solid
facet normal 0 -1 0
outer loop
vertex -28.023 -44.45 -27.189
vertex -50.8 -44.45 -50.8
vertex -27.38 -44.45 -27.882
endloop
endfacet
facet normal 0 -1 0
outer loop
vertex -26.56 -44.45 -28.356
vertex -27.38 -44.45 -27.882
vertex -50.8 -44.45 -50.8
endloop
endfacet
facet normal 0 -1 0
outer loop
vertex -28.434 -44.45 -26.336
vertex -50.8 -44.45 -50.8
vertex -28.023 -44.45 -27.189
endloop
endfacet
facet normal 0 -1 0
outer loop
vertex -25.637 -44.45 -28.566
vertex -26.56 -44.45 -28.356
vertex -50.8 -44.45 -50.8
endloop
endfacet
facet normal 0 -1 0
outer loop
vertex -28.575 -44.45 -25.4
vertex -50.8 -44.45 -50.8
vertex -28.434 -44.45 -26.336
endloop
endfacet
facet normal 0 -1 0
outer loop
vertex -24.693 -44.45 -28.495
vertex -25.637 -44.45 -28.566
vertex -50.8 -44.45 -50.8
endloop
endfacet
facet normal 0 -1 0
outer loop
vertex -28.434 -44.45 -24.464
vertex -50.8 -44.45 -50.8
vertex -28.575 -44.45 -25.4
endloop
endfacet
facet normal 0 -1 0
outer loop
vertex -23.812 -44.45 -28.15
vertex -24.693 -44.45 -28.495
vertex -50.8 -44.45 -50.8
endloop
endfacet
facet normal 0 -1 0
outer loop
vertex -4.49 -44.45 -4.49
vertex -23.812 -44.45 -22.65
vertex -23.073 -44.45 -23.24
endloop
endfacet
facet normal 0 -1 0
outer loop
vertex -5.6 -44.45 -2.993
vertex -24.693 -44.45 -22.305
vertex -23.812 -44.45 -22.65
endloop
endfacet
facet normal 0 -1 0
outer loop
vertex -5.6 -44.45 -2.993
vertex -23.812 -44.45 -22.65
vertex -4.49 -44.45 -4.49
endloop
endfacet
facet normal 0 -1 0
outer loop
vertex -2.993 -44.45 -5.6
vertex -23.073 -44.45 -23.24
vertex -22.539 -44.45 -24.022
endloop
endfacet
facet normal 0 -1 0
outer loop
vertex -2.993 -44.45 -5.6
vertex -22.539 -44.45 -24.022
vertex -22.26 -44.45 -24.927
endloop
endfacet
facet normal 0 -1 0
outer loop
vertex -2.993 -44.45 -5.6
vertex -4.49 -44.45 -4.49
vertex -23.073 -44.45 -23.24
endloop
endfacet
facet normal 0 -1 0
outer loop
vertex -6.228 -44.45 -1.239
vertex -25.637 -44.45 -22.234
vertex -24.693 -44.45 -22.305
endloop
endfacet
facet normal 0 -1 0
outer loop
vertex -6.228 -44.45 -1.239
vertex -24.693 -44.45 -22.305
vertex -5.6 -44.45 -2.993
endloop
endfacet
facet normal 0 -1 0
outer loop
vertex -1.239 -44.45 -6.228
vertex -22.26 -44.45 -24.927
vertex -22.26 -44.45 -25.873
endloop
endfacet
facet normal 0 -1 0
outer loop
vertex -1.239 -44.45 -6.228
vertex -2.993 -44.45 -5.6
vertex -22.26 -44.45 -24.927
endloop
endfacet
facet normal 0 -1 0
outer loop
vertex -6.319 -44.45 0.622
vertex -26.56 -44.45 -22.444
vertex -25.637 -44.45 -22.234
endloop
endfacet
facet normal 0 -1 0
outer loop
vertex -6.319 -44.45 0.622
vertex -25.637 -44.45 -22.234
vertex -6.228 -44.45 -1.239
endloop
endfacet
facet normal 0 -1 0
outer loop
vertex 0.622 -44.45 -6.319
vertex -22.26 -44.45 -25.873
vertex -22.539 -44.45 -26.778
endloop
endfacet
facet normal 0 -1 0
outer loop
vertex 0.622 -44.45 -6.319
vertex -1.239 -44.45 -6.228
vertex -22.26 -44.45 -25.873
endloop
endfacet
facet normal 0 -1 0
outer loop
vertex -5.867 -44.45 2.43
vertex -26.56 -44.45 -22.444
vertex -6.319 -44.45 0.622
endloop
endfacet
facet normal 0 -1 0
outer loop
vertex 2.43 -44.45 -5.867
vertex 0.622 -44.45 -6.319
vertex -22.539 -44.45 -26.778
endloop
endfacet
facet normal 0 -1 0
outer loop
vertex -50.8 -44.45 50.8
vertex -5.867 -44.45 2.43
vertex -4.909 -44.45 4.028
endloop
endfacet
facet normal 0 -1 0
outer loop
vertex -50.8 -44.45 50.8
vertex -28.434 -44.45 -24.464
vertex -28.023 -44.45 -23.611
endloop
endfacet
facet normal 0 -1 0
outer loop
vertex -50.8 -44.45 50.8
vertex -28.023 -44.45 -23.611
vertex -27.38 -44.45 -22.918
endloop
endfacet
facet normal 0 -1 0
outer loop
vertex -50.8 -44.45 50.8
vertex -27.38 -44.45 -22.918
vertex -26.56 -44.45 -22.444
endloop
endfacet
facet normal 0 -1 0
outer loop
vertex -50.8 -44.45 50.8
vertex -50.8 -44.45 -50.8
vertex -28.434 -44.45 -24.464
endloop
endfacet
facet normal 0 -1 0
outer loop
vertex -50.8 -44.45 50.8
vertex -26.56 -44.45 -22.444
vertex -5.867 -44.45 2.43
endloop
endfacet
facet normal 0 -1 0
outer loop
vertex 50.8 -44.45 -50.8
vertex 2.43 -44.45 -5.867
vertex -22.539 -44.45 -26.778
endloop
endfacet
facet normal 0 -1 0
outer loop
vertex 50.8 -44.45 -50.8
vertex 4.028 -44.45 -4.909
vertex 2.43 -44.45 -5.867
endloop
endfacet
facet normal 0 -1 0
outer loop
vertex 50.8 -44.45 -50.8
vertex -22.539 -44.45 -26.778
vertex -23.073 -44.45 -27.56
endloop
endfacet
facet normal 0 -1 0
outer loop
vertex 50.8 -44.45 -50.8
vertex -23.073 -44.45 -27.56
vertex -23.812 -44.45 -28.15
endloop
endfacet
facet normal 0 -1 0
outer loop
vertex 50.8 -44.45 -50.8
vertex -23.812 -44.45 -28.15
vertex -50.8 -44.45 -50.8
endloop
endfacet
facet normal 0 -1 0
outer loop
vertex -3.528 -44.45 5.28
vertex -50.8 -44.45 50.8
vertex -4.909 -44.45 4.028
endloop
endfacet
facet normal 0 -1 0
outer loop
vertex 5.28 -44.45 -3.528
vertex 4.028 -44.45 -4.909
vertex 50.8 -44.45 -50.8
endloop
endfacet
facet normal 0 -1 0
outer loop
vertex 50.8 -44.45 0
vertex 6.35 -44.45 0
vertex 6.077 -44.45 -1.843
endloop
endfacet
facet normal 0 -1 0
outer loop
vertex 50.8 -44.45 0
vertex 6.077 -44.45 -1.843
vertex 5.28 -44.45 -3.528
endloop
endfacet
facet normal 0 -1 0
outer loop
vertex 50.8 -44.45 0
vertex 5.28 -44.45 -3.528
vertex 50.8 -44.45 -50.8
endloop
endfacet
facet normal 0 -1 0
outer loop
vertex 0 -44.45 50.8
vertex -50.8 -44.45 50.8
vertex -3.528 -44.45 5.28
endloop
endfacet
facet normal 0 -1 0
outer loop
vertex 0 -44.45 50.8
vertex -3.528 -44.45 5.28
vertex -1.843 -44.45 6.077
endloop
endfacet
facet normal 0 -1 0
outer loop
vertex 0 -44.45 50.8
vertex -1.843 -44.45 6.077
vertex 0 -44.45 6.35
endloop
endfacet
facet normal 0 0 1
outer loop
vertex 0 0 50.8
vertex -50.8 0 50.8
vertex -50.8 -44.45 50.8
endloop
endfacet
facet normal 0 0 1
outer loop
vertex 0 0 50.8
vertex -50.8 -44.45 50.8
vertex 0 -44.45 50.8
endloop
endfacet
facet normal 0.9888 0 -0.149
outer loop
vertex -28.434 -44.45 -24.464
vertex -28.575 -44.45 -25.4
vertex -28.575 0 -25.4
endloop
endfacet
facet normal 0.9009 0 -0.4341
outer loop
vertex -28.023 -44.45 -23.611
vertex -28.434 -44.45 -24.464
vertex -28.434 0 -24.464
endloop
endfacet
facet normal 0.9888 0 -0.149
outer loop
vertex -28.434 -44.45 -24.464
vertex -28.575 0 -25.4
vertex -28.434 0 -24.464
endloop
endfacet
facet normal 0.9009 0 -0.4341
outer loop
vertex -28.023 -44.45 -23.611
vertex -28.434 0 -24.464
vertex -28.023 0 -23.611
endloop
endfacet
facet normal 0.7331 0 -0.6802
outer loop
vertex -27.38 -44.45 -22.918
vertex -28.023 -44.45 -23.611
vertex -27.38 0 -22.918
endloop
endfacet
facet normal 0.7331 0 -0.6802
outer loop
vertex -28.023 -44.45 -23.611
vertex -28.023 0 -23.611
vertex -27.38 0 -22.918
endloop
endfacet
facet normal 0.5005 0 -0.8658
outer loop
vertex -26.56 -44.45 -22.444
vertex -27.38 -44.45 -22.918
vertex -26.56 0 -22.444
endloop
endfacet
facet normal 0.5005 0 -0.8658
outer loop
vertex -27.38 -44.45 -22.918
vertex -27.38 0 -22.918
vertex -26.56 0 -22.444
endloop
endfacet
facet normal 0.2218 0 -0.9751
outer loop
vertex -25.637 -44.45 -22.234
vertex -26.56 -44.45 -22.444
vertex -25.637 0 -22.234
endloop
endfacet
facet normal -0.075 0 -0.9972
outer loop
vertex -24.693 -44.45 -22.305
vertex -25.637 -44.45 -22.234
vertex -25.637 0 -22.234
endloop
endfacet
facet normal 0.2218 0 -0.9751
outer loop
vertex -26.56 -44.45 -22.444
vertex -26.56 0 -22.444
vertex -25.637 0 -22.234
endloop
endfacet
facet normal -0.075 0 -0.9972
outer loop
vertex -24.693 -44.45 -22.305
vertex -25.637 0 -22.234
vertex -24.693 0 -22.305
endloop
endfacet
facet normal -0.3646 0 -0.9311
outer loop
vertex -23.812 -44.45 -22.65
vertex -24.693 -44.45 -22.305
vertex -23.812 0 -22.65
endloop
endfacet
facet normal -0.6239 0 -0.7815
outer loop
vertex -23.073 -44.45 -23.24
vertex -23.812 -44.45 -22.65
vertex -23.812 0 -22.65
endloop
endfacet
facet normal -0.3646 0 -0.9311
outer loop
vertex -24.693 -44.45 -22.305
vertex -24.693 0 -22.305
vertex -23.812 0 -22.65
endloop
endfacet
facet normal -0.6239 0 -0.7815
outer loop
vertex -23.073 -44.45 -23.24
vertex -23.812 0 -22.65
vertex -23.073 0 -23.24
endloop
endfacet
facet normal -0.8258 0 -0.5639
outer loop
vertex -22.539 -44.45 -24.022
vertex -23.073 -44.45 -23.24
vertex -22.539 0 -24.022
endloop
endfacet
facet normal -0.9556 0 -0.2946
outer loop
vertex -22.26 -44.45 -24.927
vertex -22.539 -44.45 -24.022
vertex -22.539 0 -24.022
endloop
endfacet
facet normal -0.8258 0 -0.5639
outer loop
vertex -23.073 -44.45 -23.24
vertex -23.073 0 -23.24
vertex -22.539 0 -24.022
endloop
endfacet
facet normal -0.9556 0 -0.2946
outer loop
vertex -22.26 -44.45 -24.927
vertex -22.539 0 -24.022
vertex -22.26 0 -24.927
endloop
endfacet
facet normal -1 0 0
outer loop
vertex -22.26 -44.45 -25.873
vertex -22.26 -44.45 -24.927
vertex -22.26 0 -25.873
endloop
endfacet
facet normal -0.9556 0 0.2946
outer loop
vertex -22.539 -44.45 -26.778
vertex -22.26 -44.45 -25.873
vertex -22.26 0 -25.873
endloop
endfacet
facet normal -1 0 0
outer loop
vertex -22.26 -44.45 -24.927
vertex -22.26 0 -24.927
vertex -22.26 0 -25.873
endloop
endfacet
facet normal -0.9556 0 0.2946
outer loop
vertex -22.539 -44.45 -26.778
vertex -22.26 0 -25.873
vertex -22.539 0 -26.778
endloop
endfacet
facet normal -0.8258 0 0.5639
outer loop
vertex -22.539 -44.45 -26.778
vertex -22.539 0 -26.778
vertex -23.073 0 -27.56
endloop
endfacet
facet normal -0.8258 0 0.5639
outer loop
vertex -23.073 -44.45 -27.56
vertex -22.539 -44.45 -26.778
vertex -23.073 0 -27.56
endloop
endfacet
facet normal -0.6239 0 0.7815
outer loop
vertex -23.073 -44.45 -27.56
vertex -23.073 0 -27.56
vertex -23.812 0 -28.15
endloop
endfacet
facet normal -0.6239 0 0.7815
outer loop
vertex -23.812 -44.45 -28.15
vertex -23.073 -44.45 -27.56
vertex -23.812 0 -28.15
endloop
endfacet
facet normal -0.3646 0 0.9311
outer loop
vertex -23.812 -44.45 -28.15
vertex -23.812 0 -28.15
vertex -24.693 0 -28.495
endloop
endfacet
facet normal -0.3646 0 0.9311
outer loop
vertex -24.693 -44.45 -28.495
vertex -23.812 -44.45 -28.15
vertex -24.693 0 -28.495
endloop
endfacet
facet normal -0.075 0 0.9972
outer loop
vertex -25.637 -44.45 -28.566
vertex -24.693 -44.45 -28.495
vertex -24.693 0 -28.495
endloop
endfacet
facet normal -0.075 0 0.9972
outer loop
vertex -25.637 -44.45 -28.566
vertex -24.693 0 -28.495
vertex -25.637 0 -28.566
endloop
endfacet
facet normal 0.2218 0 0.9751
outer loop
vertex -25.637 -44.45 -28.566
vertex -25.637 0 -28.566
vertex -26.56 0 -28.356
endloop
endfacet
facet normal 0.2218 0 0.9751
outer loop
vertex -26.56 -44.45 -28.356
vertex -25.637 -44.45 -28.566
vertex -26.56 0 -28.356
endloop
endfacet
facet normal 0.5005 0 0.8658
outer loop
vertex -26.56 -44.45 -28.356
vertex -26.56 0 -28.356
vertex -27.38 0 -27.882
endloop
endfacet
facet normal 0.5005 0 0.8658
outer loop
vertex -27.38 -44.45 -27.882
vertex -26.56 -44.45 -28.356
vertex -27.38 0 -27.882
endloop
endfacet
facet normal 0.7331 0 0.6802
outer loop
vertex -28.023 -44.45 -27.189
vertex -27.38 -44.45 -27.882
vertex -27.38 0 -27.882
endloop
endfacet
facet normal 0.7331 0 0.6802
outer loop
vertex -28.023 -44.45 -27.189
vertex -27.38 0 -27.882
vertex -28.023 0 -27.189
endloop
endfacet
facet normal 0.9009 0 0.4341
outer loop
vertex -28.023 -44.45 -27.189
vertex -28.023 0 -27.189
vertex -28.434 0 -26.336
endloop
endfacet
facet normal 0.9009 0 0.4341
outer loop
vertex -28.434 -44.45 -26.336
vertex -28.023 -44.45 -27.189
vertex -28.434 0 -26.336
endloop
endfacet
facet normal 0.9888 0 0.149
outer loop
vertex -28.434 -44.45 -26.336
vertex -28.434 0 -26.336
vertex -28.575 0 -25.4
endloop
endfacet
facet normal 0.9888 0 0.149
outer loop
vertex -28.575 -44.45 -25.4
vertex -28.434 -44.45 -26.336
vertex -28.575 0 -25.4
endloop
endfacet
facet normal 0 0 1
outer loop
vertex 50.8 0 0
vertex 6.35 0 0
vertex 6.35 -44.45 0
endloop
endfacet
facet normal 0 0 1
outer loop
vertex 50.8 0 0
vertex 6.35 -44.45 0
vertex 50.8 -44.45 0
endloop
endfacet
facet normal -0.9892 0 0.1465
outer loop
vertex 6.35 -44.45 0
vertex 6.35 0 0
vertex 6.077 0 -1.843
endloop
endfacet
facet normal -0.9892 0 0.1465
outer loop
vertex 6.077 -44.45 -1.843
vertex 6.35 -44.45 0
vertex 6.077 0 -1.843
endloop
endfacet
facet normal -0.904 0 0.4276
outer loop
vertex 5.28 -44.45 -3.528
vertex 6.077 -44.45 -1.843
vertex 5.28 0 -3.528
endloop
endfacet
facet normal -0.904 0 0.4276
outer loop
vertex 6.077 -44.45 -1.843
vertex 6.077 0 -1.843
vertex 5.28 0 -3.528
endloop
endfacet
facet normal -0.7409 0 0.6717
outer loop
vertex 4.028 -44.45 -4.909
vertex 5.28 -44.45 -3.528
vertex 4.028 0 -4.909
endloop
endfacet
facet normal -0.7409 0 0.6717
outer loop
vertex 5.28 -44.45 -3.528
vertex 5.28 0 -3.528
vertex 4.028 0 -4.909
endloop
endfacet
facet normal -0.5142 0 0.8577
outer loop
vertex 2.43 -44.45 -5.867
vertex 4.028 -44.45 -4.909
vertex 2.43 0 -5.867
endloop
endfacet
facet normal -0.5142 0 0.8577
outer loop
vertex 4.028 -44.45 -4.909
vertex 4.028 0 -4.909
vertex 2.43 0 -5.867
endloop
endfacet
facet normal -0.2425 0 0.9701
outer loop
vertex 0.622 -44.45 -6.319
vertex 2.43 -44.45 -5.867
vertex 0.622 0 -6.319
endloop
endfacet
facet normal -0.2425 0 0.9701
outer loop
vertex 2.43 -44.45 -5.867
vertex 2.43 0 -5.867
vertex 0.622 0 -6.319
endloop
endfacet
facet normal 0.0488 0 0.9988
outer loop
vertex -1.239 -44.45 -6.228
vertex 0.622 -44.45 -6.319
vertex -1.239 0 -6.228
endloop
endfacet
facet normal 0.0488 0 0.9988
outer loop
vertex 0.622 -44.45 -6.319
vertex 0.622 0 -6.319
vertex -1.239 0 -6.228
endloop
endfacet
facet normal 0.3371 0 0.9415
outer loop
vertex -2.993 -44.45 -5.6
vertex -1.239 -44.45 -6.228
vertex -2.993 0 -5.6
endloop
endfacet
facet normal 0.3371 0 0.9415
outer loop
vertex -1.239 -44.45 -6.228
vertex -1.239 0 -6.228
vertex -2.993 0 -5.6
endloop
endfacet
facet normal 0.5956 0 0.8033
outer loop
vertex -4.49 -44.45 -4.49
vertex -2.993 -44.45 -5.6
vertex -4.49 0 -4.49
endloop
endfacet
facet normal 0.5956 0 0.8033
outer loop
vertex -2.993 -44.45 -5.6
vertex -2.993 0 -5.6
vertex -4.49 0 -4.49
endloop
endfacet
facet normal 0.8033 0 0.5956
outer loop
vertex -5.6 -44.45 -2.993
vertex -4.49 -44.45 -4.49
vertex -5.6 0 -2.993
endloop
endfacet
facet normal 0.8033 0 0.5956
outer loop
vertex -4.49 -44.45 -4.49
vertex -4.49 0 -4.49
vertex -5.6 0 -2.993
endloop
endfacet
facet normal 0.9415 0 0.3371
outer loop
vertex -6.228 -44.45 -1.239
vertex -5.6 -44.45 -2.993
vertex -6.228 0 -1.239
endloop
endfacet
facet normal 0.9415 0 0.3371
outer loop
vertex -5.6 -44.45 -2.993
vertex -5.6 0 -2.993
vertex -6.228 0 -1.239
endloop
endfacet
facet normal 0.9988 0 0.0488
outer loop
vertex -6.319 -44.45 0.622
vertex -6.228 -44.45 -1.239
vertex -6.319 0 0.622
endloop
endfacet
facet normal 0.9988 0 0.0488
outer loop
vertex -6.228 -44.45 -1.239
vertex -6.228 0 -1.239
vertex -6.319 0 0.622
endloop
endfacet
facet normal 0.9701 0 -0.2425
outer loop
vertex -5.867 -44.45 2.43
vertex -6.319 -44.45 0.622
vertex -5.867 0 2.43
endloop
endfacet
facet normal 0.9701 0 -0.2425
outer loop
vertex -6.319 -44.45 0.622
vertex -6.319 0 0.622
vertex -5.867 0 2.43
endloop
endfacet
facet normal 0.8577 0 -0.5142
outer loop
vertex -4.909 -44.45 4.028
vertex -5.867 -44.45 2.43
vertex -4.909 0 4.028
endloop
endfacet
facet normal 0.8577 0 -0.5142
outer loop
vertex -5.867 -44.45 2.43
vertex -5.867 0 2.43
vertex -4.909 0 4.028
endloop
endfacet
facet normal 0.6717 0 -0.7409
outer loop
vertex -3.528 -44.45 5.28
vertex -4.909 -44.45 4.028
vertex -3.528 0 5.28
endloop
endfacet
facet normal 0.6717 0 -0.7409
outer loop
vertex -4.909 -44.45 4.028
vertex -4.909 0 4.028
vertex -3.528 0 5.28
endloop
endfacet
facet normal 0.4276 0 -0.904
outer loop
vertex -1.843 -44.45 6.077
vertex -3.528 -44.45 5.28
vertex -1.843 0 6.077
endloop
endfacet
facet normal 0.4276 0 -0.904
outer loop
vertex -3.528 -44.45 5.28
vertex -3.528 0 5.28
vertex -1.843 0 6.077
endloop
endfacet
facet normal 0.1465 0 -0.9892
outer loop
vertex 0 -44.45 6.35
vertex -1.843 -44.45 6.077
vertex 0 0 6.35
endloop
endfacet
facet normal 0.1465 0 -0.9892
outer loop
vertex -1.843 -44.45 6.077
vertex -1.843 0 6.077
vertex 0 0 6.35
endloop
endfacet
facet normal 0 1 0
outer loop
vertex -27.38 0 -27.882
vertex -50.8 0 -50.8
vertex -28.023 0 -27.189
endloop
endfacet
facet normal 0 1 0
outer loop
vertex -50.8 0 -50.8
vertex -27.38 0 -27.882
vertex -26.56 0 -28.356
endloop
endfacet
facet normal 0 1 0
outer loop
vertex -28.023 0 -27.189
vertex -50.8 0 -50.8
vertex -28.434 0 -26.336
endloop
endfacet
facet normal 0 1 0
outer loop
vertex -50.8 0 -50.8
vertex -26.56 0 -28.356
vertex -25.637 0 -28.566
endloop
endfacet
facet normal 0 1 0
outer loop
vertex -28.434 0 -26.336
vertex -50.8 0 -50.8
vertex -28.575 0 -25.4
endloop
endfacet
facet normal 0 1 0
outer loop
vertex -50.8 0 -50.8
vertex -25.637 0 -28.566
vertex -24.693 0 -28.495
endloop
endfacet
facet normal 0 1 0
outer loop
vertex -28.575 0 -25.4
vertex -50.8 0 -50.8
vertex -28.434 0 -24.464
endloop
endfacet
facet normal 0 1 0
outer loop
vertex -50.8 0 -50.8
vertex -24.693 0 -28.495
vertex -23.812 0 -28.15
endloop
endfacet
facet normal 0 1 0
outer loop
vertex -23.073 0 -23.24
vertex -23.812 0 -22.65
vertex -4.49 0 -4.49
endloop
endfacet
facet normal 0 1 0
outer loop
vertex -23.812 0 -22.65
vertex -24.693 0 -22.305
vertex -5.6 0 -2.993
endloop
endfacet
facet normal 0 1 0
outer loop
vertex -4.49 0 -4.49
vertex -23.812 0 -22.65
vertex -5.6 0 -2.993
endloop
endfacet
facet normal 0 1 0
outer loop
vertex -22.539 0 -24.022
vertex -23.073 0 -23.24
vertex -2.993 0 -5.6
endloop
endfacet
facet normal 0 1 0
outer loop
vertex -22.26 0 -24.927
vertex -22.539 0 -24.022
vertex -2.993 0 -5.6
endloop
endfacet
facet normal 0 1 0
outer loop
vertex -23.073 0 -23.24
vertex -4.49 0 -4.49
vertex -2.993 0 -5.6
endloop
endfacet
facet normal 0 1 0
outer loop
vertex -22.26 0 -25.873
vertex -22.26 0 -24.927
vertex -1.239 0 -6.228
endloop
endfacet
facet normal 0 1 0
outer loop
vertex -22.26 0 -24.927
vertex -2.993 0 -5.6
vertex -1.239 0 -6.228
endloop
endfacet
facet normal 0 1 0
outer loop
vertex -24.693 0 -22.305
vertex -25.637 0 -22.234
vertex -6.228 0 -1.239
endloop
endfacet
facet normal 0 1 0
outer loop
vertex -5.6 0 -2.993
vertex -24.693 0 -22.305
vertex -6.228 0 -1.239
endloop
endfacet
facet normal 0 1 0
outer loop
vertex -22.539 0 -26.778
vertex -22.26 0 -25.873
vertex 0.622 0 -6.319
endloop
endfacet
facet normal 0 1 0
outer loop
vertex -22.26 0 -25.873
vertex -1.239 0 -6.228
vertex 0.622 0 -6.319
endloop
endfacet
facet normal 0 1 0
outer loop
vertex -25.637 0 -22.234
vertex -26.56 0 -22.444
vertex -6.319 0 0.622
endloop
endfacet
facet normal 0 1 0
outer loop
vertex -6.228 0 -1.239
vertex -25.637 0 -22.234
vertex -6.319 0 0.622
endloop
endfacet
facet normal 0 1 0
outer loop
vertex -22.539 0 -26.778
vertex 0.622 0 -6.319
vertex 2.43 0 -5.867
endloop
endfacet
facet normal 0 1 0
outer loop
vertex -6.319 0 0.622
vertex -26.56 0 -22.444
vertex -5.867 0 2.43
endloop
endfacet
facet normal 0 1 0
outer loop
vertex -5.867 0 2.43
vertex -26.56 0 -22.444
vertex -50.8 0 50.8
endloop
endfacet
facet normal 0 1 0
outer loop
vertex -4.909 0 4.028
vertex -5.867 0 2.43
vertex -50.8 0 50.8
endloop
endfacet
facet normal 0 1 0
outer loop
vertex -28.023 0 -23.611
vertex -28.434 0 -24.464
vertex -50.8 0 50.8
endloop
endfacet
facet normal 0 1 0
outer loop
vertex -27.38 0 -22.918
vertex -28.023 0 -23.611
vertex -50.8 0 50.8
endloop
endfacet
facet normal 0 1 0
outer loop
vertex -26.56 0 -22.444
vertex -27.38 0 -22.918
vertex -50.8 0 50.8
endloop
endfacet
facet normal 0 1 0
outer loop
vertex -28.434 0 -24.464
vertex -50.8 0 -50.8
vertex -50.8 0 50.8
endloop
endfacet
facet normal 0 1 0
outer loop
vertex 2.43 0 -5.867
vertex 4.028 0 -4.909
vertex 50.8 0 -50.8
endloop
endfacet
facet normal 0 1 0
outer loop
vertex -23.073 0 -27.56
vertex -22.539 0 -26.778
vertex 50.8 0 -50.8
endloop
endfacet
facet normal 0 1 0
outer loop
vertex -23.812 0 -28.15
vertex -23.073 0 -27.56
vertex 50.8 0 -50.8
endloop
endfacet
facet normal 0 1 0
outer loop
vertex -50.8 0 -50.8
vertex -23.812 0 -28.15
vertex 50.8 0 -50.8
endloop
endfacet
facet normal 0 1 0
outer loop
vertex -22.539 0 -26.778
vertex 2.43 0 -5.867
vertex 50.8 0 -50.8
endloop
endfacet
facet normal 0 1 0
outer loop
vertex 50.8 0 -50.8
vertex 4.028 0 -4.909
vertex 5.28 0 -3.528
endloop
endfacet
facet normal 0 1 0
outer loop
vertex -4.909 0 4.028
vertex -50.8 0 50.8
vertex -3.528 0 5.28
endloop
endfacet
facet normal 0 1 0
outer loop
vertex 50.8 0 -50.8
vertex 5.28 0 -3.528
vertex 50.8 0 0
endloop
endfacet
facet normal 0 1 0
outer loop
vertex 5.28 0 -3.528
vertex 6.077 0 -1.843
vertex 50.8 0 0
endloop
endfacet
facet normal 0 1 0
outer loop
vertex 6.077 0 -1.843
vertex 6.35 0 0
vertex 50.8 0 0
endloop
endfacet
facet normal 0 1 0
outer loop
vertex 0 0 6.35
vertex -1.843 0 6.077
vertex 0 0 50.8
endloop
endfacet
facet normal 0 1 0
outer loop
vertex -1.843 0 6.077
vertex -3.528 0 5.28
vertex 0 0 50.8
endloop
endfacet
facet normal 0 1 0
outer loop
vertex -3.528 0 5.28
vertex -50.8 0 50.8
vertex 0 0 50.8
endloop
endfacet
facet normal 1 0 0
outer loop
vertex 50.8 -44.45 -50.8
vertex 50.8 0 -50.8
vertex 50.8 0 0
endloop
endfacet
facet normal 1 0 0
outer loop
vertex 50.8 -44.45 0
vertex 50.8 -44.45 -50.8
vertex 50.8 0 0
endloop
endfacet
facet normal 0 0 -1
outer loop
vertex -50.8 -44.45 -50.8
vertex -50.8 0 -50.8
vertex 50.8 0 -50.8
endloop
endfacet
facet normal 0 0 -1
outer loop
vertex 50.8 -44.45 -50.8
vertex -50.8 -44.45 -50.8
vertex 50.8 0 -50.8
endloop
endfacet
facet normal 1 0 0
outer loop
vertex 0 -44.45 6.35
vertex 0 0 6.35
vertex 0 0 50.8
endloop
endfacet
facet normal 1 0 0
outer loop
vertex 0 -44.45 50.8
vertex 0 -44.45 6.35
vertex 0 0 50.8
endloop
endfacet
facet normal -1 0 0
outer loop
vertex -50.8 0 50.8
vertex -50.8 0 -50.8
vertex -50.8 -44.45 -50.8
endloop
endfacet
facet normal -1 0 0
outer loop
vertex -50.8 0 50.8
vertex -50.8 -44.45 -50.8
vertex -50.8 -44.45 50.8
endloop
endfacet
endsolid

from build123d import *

# Parameters (mm, degrees)
F0_W     = 101.6
F0_H     = 101.6
F1_DEPTH = 44.45
F3_D     = 12.7
F4_W     = 50.8
F4_H     = 50.8
F5_DEPTH = 88.9
F7_D     = 6.35


with BuildPart() as f1:
    # F0 (on Front) → F1 (new body)
    with BuildSketch(Plane.XZ):
        Rectangle(F0_W, F0_H)
    extrude(amount=F1_DEPTH)

    # F3 (through all)
    with Locations(Plane.XZ.offset(44.45)):
        with Locations((0, 0)):
            Hole(F3_D / 2)

    # F4 (on face) → F5 (cut)
    with BuildSketch(Plane.XZ.offset(44.45)):
        with Locations((25.4, 25.4)):
            Rectangle(F4_W, F4_H)
    extrude(amount=-F5_DEPTH, mode=Mode.SUBTRACT)

    # F7 (through all)
    with Locations(Plane.XZ.offset(44.45)):
        with Locations((-25.4, -25.4)):
            Hole(F7_D / 2)


solid = f1.part
